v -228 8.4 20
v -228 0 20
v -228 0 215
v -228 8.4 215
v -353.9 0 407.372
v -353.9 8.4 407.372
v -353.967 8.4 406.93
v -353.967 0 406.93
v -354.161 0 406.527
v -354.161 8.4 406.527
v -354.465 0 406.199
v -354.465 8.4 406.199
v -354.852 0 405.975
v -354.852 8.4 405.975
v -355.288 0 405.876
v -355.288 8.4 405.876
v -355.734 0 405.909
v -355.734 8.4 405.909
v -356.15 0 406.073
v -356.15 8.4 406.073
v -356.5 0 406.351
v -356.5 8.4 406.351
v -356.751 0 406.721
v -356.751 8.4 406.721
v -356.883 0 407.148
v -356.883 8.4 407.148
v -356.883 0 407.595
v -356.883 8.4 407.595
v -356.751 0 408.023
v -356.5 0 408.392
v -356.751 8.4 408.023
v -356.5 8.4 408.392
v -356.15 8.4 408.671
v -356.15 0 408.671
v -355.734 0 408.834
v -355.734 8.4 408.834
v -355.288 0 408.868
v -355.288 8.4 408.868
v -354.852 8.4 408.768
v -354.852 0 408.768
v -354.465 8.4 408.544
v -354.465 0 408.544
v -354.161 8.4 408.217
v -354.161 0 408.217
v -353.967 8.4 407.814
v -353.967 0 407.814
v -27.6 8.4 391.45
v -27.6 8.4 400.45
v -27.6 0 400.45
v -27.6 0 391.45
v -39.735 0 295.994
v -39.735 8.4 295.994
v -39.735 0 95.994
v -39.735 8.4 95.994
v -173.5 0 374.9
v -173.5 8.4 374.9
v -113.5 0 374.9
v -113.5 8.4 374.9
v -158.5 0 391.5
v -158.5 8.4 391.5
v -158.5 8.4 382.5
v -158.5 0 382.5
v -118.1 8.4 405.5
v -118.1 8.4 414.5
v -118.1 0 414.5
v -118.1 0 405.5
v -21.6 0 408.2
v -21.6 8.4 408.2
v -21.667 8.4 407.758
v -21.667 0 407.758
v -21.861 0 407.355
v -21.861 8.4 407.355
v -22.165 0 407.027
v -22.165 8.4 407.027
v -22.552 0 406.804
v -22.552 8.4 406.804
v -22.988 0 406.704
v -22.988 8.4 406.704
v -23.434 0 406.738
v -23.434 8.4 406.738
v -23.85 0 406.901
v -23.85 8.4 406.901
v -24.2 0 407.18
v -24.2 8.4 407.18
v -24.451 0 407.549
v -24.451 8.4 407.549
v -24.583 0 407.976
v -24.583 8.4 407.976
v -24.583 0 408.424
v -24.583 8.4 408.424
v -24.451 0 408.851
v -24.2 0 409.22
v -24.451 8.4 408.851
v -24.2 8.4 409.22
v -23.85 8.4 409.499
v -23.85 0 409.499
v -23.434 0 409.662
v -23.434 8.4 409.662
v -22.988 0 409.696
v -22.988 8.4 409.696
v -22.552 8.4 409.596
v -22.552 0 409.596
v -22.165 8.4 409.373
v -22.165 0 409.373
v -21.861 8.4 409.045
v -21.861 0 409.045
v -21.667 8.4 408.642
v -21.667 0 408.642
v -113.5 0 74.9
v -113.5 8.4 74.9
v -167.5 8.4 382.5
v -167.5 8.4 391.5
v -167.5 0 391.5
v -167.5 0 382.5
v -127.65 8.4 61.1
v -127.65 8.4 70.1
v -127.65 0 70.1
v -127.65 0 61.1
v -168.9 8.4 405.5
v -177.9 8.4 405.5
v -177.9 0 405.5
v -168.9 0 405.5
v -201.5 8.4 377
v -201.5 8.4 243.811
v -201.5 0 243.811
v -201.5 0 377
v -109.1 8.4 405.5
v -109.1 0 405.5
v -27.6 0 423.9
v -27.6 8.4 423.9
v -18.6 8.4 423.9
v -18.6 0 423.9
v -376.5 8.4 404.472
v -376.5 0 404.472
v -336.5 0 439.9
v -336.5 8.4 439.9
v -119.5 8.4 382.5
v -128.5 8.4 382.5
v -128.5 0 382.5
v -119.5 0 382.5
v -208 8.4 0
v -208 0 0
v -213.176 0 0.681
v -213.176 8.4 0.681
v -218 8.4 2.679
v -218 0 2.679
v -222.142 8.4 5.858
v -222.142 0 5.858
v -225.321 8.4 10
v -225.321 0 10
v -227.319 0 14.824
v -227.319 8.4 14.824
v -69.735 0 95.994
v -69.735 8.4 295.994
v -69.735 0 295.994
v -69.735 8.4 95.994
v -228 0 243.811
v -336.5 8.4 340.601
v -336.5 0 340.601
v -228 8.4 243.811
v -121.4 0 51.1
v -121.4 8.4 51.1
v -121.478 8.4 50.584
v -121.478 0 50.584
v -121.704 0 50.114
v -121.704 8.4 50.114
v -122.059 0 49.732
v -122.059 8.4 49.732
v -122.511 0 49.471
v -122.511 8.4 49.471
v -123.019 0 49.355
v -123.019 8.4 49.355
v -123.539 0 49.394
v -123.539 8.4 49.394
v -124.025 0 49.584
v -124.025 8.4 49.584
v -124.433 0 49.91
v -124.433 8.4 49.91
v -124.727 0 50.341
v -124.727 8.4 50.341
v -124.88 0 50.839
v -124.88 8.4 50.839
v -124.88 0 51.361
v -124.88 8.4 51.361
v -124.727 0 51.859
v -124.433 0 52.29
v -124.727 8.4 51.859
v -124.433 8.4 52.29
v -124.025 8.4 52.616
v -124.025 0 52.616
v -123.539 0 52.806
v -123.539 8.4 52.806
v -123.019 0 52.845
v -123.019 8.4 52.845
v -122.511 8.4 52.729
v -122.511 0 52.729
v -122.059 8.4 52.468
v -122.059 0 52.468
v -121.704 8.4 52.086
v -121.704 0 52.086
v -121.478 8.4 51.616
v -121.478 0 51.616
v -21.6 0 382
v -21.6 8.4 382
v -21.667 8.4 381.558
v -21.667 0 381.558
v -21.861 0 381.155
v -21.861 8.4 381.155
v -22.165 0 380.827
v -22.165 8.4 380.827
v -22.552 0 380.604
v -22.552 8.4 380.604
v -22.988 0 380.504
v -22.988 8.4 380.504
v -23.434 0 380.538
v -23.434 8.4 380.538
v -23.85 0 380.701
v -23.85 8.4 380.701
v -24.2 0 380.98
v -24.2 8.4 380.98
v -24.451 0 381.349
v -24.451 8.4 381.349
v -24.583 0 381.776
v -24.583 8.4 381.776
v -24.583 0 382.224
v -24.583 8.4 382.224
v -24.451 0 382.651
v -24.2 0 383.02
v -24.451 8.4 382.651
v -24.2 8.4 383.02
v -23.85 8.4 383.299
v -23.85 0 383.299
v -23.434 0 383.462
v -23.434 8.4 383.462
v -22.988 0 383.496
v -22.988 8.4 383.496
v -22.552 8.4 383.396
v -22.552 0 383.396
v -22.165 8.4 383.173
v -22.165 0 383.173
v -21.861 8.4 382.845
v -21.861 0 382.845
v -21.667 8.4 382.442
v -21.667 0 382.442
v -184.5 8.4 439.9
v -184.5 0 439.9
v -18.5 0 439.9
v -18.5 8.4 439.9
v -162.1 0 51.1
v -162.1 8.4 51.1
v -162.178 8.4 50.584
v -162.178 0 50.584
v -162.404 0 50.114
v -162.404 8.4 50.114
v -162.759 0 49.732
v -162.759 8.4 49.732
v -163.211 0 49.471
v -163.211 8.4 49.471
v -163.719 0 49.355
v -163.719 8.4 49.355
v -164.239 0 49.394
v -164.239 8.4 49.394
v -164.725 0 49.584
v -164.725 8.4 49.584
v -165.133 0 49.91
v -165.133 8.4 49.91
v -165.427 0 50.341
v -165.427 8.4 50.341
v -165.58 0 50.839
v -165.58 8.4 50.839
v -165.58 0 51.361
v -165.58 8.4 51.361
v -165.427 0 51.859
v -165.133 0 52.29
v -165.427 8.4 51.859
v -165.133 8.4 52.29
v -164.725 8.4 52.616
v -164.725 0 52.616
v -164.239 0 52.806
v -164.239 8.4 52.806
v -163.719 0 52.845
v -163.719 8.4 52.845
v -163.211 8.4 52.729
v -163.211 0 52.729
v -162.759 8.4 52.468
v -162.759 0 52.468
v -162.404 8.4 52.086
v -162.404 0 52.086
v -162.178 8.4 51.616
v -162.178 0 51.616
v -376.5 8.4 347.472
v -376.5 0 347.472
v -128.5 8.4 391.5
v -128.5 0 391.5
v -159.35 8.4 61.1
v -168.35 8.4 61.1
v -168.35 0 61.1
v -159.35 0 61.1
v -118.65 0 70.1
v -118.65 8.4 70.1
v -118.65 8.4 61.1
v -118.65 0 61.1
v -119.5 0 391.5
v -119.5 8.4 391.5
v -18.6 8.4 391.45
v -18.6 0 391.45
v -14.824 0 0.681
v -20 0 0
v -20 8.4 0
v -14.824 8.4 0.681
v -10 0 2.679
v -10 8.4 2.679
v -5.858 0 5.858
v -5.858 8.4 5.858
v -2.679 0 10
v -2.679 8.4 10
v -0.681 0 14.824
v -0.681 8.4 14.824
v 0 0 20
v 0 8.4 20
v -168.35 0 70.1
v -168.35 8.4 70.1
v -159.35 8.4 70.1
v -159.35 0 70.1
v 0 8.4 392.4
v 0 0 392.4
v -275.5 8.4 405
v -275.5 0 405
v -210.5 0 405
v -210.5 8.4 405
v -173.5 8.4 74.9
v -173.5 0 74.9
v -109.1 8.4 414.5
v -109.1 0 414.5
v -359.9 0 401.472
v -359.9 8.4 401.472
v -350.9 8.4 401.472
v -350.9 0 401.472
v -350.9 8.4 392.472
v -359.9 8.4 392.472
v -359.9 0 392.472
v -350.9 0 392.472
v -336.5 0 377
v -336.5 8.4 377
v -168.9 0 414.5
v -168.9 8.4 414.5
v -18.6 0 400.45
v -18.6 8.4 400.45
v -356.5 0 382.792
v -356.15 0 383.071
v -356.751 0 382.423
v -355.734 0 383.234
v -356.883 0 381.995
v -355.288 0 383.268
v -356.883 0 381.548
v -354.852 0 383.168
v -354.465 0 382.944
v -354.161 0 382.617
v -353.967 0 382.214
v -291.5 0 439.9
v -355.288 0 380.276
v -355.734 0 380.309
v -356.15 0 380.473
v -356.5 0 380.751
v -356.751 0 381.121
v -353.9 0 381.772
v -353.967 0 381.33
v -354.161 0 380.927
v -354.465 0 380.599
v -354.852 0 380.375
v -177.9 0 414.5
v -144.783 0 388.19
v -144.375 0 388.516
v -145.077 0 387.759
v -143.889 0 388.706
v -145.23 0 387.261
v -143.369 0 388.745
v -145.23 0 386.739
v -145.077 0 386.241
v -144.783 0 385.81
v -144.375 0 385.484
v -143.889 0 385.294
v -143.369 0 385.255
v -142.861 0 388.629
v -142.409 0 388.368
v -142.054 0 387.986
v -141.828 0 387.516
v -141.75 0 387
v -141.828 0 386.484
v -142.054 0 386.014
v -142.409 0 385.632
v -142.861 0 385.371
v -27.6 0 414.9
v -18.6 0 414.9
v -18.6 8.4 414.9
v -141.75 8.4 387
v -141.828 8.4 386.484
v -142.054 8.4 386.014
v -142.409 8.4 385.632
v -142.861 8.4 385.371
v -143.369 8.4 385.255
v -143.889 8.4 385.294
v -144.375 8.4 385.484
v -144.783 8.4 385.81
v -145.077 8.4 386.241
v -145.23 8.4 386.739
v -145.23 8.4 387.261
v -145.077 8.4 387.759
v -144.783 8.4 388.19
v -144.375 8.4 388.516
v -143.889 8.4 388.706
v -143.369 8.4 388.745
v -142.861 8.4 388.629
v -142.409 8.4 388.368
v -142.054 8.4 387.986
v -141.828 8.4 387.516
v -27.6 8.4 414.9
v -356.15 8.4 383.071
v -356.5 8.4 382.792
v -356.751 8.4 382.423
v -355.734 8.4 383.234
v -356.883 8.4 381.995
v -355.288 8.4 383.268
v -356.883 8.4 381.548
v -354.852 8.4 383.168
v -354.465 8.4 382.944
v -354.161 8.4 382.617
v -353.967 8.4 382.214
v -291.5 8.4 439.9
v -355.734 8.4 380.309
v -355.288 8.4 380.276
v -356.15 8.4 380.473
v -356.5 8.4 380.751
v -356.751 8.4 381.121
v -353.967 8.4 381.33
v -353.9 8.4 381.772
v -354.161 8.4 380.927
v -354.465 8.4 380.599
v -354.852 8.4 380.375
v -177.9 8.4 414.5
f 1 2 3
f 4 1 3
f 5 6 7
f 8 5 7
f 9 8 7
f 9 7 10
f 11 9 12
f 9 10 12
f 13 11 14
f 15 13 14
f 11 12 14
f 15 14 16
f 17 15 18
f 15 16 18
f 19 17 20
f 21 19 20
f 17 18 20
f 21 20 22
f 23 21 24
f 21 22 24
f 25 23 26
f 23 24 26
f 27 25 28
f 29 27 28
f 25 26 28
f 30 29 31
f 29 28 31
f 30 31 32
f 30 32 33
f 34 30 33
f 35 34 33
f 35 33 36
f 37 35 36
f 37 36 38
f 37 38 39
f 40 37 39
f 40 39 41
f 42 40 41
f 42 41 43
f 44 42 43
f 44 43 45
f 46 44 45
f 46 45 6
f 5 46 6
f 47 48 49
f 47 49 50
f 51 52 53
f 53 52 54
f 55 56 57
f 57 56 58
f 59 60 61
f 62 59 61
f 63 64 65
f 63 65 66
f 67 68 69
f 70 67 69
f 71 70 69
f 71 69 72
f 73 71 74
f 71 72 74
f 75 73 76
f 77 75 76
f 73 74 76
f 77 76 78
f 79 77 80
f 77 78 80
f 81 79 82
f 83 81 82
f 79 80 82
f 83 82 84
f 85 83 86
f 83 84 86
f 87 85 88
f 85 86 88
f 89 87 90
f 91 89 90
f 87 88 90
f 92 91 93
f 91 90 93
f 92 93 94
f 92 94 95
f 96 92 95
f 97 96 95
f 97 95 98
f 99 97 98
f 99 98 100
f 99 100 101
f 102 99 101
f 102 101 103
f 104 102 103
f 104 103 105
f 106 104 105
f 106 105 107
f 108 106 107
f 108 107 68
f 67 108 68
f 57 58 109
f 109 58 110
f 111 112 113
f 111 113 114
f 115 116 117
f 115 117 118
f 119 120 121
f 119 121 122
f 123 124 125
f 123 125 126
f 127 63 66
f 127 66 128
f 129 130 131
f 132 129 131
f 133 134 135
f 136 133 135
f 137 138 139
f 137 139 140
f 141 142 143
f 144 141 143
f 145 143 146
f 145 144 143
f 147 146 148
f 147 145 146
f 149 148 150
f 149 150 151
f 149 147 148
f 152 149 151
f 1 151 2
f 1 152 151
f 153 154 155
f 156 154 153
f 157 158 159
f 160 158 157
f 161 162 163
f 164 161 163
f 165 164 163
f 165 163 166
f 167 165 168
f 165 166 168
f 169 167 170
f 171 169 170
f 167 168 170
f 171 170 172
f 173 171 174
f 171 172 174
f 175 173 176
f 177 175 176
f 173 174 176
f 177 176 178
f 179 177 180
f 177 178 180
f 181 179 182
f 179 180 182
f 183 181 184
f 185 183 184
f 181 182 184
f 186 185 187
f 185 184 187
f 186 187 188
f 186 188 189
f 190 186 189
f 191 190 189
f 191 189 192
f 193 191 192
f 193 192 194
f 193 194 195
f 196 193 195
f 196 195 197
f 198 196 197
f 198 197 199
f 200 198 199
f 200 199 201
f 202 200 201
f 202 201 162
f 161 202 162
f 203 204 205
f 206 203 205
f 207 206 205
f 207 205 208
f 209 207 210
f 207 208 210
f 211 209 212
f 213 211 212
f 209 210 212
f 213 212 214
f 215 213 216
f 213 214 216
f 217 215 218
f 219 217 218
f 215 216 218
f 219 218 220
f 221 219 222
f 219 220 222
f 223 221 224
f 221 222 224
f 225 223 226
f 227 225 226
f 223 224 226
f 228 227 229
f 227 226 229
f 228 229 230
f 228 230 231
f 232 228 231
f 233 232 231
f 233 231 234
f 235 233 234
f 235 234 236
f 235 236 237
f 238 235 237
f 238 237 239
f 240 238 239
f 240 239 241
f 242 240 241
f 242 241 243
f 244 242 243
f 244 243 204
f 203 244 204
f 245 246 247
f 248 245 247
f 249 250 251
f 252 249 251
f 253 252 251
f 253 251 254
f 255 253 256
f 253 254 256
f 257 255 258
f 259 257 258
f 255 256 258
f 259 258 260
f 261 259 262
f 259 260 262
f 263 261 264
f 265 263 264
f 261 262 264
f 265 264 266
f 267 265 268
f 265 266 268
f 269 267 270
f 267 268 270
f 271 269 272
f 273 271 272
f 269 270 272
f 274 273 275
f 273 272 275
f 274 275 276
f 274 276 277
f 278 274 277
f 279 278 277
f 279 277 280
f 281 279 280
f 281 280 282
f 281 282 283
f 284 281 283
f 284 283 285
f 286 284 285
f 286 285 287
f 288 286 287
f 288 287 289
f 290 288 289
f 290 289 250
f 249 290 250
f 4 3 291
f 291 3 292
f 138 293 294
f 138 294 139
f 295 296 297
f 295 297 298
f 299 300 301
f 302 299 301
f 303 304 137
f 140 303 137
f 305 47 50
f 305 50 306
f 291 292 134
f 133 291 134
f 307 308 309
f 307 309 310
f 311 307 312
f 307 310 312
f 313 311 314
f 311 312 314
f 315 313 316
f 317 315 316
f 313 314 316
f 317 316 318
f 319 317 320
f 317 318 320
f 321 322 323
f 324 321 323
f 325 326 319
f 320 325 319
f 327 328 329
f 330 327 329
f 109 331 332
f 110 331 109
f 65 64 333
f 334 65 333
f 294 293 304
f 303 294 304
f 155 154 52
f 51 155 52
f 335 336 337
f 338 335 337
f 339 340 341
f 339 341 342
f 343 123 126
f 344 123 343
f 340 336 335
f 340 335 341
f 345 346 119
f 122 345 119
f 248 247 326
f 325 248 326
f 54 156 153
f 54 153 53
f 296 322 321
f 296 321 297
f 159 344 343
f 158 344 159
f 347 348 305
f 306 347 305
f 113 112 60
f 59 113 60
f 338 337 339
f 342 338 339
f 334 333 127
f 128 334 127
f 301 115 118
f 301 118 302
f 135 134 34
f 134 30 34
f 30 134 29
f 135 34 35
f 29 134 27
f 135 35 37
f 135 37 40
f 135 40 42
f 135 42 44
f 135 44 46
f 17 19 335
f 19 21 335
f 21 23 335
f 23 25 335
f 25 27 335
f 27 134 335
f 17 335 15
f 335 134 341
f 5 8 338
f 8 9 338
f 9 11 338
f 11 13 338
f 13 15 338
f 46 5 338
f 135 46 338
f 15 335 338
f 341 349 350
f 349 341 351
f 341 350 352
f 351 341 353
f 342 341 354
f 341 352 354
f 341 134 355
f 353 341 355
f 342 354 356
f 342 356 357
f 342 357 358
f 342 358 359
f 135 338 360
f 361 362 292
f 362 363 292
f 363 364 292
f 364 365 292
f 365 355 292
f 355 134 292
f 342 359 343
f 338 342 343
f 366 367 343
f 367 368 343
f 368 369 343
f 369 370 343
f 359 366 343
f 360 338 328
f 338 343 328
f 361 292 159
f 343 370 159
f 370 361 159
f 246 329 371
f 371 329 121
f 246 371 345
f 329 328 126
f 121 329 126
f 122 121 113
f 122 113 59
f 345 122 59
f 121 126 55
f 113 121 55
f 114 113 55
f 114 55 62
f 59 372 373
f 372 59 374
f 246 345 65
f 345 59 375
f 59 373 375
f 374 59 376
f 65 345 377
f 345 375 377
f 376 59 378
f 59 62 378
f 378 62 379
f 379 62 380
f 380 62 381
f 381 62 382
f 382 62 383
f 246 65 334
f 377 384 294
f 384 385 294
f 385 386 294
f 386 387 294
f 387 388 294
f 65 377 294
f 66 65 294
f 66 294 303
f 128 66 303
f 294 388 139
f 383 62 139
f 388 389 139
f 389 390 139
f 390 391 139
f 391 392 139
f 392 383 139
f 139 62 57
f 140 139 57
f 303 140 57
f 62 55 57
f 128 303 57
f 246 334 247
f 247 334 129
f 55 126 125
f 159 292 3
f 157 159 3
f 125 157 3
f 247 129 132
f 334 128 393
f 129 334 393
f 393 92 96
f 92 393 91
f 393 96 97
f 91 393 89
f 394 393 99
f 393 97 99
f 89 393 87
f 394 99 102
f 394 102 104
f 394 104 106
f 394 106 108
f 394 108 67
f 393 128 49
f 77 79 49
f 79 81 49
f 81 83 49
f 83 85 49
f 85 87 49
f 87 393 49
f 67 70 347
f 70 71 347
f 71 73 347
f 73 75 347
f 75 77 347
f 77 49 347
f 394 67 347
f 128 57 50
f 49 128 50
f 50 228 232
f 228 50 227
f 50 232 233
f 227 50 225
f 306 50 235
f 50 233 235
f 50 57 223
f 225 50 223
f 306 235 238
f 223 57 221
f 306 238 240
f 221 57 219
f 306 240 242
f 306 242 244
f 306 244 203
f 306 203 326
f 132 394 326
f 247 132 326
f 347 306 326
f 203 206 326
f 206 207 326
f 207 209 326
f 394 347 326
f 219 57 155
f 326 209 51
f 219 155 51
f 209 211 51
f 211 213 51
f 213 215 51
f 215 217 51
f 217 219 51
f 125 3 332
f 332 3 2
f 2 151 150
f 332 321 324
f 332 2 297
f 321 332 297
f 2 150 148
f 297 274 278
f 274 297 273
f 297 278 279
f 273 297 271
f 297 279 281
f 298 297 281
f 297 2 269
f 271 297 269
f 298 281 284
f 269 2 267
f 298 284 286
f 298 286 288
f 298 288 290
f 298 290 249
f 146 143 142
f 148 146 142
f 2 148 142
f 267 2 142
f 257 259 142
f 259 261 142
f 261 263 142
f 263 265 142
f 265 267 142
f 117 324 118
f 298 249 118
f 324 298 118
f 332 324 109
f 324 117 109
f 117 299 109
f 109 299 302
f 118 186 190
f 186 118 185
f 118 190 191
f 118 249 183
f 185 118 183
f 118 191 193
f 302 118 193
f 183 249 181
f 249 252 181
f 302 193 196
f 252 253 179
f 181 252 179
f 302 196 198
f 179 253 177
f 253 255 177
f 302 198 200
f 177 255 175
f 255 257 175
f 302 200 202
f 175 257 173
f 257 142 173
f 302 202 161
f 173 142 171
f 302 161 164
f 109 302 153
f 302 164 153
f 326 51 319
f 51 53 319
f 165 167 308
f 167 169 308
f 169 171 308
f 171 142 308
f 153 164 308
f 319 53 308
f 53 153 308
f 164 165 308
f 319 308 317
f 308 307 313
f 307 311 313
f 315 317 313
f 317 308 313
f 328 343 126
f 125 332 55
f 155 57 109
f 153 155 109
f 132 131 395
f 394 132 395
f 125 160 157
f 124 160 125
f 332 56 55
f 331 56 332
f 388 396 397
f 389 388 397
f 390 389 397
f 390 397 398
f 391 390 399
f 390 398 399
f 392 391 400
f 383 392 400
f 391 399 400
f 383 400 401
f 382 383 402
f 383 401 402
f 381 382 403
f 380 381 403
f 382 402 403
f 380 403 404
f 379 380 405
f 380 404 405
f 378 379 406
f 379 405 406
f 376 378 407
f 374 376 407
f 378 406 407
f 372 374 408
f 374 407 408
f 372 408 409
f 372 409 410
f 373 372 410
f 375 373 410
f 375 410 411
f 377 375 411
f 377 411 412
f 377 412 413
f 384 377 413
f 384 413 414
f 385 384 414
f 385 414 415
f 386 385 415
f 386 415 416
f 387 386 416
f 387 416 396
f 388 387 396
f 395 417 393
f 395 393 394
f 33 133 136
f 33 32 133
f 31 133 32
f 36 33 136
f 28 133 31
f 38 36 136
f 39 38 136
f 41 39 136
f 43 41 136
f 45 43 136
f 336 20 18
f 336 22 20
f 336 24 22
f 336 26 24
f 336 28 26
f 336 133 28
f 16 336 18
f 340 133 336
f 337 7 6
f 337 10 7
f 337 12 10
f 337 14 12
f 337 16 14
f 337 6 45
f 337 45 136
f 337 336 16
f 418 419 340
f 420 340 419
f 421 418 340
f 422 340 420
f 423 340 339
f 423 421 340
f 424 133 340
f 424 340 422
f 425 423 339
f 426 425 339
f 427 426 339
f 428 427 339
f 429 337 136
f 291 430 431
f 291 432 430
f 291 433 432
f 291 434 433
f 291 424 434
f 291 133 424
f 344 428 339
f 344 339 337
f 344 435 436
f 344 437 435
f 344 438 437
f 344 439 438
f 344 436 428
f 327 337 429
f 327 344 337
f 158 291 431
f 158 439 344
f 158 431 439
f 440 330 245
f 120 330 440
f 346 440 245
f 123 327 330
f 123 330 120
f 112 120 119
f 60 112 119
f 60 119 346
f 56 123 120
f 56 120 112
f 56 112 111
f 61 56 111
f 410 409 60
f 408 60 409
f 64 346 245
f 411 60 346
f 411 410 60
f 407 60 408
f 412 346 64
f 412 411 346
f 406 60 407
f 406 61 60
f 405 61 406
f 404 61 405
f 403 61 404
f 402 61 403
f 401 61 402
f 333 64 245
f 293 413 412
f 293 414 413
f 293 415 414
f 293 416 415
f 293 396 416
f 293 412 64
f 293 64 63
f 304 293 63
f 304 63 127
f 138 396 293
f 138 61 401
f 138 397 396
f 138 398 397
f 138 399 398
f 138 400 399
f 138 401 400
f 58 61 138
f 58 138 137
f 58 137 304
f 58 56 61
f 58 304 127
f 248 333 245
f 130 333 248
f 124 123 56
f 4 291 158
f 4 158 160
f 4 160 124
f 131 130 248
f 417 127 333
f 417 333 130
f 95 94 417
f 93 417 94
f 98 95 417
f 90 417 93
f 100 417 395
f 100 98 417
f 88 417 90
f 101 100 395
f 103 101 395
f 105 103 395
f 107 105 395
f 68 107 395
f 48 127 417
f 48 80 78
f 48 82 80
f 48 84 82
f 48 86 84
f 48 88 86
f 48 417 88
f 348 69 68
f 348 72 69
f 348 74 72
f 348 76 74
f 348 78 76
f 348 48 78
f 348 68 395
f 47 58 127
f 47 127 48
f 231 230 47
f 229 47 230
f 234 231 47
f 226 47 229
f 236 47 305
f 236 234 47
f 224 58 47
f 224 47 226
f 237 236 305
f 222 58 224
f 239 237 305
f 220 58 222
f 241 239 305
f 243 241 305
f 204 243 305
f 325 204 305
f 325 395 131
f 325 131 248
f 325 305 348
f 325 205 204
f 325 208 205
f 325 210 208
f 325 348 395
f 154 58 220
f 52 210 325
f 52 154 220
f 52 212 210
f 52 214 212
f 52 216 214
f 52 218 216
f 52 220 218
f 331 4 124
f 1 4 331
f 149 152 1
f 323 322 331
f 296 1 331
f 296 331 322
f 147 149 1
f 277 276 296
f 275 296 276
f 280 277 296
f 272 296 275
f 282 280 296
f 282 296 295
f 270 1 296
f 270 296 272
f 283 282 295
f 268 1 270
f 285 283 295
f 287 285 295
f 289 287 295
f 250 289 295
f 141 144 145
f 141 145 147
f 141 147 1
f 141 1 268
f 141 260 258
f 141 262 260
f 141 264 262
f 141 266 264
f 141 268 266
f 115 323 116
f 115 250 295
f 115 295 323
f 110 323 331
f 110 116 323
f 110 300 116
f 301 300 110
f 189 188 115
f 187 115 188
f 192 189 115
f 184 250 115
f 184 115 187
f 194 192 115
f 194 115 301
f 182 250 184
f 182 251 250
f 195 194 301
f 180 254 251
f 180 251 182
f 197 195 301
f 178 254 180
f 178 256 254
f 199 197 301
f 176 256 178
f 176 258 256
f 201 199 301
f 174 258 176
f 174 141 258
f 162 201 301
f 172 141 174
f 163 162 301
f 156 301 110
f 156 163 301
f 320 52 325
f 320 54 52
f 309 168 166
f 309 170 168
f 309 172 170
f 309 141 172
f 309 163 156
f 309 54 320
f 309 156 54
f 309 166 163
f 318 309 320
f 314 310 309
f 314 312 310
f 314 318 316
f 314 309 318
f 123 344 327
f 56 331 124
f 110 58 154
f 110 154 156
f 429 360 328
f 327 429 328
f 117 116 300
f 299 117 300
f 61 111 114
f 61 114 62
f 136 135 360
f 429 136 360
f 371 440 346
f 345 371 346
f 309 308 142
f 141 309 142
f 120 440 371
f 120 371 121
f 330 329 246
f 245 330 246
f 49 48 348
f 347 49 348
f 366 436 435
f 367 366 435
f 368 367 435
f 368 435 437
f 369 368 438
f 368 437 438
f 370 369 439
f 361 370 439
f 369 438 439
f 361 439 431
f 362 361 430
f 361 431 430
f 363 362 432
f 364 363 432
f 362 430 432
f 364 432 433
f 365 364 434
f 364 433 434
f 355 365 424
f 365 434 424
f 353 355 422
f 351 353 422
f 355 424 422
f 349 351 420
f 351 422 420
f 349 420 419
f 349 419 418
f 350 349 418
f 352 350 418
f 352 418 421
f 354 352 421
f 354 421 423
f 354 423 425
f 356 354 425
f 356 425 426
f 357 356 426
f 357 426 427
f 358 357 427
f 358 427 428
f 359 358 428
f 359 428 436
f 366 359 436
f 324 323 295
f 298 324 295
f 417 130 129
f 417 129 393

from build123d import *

# Parameters (mm, degrees)
BOSS_EXTRUDE1_DEPTH = 8.4
SKETCH2_R           = 1.5
SKETCH2_R_2         = 1.75
SKETCH2_W           = 60
SKETCH2_H           = 300
SKETCH2_W_2         = 9
SKETCH2_H_2         = 9
CUT_EXTRUDE1_DEPTH  = 9.4
FILLET1_R           = 20
SKETCH4_W           = 30
SKETCH4_H           = 200
CUT_EXTRUDE3_DEPTH  = 9.4


with BuildPart() as part:
    # Sketch1 → Boss-Extrude1 (new body)
    with BuildSketch(Plane(origin=(0, 0, 0), x_dir=(1, 0, 0), z_dir=(0, 1, 0))):
        Polygon((0, 0), (-228, 0), (-228, -215), (-376.5, -347.47169509), (-376.5, -404.47169509), (-336.5, -439.9), (-291.5, -439.9), (-275.5, -405), (-210.5, -405), (-184.5, -439.9), (-18.5, -439.9), (0, -392.4), align=None)
    extrude(amount=BOSS_EXTRUDE1_DEPTH)

    # Sketch2 → Cut-Extrude1 (cut, through all)
    with BuildSketch(Plane(origin=(0, 8.4, 0), x_dir=(1, 0, 0), z_dir=(0, 1, 0))):
        with Locations((-23.1, -408.2)):
            Circle(SKETCH2_R)
        with Locations((-23.1, -382)):
            Circle(SKETCH2_R)
        with Locations((-355.4, -407.37169509)):
            Circle(SKETCH2_R)
        with Locations((-355.4, -381.77169509)):
            Circle(SKETCH2_R)
        with Locations((-163.85, -51.1)):
            Circle(SKETCH2_R_2)
        with Locations((-123.15, -51.1)):
            Circle(SKETCH2_R_2)
        with Locations((-143.5, -387)):
            Circle(SKETCH2_R_2)
        Polygon((-336.5, -340.600531429), (-228, -243.811447811), (-201.5, -243.811447811), (-201.5, -377), (-336.5, -377), align=None)
        with Locations((-143.5, -224.9)):
            Rectangle(SKETCH2_W, SKETCH2_H)
        with Locations((-23.1, -419.4)):
            Rectangle(SKETCH2_W_2, SKETCH2_H_2)
        with Locations((-23.1, -395.95)):
            Rectangle(SKETCH2_W_2, SKETCH2_H_2)
        with Locations((-355.4, -396.97169509)):
            Rectangle(SKETCH2_W_2, SKETCH2_H_2)
        with Locations((-163.85, -65.6)):
            Rectangle(SKETCH2_W_2, SKETCH2_H_2)
        with Locations((-123.15, -65.6)):
            Rectangle(SKETCH2_W_2, SKETCH2_H_2)
        with Locations((-163, -387)):
            Rectangle(SKETCH2_W_2, SKETCH2_H_2)
        with Locations((-124, -387)):
            Rectangle(SKETCH2_W_2, SKETCH2_H_2)
        with Locations((-173.4, -410)):
            Rectangle(SKETCH2_W_2, SKETCH2_H_2)
        with Locations((-113.6, -410)):
            Rectangle(SKETCH2_W_2, SKETCH2_H_2)
    extrude(amount=-CUT_EXTRUDE1_DEPTH, mode=Mode.SUBTRACT)

    # Fillet1
    fillet1_edges = [part.edges().sort_by_distance(p)[0] for p in [
        (-228, 4.2, 0),
        (0, 4.2, 0),
    ]]
    fillet(fillet1_edges, radius=FILLET1_R)

    # Sketch4 → Cut-Extrude3 (cut, through all)
    with BuildSketch(Plane(origin=(0, 8.4, 0), x_dir=(1, 0, 0), z_dir=(0, 1, 0))):
        with Locations((-54.735091888, -195.993725651)):
            Rectangle(SKETCH4_W, SKETCH4_H)
    extrude(amount=-CUT_EXTRUDE3_DEPTH, mode=Mode.SUBTRACT)


solid = part.part
